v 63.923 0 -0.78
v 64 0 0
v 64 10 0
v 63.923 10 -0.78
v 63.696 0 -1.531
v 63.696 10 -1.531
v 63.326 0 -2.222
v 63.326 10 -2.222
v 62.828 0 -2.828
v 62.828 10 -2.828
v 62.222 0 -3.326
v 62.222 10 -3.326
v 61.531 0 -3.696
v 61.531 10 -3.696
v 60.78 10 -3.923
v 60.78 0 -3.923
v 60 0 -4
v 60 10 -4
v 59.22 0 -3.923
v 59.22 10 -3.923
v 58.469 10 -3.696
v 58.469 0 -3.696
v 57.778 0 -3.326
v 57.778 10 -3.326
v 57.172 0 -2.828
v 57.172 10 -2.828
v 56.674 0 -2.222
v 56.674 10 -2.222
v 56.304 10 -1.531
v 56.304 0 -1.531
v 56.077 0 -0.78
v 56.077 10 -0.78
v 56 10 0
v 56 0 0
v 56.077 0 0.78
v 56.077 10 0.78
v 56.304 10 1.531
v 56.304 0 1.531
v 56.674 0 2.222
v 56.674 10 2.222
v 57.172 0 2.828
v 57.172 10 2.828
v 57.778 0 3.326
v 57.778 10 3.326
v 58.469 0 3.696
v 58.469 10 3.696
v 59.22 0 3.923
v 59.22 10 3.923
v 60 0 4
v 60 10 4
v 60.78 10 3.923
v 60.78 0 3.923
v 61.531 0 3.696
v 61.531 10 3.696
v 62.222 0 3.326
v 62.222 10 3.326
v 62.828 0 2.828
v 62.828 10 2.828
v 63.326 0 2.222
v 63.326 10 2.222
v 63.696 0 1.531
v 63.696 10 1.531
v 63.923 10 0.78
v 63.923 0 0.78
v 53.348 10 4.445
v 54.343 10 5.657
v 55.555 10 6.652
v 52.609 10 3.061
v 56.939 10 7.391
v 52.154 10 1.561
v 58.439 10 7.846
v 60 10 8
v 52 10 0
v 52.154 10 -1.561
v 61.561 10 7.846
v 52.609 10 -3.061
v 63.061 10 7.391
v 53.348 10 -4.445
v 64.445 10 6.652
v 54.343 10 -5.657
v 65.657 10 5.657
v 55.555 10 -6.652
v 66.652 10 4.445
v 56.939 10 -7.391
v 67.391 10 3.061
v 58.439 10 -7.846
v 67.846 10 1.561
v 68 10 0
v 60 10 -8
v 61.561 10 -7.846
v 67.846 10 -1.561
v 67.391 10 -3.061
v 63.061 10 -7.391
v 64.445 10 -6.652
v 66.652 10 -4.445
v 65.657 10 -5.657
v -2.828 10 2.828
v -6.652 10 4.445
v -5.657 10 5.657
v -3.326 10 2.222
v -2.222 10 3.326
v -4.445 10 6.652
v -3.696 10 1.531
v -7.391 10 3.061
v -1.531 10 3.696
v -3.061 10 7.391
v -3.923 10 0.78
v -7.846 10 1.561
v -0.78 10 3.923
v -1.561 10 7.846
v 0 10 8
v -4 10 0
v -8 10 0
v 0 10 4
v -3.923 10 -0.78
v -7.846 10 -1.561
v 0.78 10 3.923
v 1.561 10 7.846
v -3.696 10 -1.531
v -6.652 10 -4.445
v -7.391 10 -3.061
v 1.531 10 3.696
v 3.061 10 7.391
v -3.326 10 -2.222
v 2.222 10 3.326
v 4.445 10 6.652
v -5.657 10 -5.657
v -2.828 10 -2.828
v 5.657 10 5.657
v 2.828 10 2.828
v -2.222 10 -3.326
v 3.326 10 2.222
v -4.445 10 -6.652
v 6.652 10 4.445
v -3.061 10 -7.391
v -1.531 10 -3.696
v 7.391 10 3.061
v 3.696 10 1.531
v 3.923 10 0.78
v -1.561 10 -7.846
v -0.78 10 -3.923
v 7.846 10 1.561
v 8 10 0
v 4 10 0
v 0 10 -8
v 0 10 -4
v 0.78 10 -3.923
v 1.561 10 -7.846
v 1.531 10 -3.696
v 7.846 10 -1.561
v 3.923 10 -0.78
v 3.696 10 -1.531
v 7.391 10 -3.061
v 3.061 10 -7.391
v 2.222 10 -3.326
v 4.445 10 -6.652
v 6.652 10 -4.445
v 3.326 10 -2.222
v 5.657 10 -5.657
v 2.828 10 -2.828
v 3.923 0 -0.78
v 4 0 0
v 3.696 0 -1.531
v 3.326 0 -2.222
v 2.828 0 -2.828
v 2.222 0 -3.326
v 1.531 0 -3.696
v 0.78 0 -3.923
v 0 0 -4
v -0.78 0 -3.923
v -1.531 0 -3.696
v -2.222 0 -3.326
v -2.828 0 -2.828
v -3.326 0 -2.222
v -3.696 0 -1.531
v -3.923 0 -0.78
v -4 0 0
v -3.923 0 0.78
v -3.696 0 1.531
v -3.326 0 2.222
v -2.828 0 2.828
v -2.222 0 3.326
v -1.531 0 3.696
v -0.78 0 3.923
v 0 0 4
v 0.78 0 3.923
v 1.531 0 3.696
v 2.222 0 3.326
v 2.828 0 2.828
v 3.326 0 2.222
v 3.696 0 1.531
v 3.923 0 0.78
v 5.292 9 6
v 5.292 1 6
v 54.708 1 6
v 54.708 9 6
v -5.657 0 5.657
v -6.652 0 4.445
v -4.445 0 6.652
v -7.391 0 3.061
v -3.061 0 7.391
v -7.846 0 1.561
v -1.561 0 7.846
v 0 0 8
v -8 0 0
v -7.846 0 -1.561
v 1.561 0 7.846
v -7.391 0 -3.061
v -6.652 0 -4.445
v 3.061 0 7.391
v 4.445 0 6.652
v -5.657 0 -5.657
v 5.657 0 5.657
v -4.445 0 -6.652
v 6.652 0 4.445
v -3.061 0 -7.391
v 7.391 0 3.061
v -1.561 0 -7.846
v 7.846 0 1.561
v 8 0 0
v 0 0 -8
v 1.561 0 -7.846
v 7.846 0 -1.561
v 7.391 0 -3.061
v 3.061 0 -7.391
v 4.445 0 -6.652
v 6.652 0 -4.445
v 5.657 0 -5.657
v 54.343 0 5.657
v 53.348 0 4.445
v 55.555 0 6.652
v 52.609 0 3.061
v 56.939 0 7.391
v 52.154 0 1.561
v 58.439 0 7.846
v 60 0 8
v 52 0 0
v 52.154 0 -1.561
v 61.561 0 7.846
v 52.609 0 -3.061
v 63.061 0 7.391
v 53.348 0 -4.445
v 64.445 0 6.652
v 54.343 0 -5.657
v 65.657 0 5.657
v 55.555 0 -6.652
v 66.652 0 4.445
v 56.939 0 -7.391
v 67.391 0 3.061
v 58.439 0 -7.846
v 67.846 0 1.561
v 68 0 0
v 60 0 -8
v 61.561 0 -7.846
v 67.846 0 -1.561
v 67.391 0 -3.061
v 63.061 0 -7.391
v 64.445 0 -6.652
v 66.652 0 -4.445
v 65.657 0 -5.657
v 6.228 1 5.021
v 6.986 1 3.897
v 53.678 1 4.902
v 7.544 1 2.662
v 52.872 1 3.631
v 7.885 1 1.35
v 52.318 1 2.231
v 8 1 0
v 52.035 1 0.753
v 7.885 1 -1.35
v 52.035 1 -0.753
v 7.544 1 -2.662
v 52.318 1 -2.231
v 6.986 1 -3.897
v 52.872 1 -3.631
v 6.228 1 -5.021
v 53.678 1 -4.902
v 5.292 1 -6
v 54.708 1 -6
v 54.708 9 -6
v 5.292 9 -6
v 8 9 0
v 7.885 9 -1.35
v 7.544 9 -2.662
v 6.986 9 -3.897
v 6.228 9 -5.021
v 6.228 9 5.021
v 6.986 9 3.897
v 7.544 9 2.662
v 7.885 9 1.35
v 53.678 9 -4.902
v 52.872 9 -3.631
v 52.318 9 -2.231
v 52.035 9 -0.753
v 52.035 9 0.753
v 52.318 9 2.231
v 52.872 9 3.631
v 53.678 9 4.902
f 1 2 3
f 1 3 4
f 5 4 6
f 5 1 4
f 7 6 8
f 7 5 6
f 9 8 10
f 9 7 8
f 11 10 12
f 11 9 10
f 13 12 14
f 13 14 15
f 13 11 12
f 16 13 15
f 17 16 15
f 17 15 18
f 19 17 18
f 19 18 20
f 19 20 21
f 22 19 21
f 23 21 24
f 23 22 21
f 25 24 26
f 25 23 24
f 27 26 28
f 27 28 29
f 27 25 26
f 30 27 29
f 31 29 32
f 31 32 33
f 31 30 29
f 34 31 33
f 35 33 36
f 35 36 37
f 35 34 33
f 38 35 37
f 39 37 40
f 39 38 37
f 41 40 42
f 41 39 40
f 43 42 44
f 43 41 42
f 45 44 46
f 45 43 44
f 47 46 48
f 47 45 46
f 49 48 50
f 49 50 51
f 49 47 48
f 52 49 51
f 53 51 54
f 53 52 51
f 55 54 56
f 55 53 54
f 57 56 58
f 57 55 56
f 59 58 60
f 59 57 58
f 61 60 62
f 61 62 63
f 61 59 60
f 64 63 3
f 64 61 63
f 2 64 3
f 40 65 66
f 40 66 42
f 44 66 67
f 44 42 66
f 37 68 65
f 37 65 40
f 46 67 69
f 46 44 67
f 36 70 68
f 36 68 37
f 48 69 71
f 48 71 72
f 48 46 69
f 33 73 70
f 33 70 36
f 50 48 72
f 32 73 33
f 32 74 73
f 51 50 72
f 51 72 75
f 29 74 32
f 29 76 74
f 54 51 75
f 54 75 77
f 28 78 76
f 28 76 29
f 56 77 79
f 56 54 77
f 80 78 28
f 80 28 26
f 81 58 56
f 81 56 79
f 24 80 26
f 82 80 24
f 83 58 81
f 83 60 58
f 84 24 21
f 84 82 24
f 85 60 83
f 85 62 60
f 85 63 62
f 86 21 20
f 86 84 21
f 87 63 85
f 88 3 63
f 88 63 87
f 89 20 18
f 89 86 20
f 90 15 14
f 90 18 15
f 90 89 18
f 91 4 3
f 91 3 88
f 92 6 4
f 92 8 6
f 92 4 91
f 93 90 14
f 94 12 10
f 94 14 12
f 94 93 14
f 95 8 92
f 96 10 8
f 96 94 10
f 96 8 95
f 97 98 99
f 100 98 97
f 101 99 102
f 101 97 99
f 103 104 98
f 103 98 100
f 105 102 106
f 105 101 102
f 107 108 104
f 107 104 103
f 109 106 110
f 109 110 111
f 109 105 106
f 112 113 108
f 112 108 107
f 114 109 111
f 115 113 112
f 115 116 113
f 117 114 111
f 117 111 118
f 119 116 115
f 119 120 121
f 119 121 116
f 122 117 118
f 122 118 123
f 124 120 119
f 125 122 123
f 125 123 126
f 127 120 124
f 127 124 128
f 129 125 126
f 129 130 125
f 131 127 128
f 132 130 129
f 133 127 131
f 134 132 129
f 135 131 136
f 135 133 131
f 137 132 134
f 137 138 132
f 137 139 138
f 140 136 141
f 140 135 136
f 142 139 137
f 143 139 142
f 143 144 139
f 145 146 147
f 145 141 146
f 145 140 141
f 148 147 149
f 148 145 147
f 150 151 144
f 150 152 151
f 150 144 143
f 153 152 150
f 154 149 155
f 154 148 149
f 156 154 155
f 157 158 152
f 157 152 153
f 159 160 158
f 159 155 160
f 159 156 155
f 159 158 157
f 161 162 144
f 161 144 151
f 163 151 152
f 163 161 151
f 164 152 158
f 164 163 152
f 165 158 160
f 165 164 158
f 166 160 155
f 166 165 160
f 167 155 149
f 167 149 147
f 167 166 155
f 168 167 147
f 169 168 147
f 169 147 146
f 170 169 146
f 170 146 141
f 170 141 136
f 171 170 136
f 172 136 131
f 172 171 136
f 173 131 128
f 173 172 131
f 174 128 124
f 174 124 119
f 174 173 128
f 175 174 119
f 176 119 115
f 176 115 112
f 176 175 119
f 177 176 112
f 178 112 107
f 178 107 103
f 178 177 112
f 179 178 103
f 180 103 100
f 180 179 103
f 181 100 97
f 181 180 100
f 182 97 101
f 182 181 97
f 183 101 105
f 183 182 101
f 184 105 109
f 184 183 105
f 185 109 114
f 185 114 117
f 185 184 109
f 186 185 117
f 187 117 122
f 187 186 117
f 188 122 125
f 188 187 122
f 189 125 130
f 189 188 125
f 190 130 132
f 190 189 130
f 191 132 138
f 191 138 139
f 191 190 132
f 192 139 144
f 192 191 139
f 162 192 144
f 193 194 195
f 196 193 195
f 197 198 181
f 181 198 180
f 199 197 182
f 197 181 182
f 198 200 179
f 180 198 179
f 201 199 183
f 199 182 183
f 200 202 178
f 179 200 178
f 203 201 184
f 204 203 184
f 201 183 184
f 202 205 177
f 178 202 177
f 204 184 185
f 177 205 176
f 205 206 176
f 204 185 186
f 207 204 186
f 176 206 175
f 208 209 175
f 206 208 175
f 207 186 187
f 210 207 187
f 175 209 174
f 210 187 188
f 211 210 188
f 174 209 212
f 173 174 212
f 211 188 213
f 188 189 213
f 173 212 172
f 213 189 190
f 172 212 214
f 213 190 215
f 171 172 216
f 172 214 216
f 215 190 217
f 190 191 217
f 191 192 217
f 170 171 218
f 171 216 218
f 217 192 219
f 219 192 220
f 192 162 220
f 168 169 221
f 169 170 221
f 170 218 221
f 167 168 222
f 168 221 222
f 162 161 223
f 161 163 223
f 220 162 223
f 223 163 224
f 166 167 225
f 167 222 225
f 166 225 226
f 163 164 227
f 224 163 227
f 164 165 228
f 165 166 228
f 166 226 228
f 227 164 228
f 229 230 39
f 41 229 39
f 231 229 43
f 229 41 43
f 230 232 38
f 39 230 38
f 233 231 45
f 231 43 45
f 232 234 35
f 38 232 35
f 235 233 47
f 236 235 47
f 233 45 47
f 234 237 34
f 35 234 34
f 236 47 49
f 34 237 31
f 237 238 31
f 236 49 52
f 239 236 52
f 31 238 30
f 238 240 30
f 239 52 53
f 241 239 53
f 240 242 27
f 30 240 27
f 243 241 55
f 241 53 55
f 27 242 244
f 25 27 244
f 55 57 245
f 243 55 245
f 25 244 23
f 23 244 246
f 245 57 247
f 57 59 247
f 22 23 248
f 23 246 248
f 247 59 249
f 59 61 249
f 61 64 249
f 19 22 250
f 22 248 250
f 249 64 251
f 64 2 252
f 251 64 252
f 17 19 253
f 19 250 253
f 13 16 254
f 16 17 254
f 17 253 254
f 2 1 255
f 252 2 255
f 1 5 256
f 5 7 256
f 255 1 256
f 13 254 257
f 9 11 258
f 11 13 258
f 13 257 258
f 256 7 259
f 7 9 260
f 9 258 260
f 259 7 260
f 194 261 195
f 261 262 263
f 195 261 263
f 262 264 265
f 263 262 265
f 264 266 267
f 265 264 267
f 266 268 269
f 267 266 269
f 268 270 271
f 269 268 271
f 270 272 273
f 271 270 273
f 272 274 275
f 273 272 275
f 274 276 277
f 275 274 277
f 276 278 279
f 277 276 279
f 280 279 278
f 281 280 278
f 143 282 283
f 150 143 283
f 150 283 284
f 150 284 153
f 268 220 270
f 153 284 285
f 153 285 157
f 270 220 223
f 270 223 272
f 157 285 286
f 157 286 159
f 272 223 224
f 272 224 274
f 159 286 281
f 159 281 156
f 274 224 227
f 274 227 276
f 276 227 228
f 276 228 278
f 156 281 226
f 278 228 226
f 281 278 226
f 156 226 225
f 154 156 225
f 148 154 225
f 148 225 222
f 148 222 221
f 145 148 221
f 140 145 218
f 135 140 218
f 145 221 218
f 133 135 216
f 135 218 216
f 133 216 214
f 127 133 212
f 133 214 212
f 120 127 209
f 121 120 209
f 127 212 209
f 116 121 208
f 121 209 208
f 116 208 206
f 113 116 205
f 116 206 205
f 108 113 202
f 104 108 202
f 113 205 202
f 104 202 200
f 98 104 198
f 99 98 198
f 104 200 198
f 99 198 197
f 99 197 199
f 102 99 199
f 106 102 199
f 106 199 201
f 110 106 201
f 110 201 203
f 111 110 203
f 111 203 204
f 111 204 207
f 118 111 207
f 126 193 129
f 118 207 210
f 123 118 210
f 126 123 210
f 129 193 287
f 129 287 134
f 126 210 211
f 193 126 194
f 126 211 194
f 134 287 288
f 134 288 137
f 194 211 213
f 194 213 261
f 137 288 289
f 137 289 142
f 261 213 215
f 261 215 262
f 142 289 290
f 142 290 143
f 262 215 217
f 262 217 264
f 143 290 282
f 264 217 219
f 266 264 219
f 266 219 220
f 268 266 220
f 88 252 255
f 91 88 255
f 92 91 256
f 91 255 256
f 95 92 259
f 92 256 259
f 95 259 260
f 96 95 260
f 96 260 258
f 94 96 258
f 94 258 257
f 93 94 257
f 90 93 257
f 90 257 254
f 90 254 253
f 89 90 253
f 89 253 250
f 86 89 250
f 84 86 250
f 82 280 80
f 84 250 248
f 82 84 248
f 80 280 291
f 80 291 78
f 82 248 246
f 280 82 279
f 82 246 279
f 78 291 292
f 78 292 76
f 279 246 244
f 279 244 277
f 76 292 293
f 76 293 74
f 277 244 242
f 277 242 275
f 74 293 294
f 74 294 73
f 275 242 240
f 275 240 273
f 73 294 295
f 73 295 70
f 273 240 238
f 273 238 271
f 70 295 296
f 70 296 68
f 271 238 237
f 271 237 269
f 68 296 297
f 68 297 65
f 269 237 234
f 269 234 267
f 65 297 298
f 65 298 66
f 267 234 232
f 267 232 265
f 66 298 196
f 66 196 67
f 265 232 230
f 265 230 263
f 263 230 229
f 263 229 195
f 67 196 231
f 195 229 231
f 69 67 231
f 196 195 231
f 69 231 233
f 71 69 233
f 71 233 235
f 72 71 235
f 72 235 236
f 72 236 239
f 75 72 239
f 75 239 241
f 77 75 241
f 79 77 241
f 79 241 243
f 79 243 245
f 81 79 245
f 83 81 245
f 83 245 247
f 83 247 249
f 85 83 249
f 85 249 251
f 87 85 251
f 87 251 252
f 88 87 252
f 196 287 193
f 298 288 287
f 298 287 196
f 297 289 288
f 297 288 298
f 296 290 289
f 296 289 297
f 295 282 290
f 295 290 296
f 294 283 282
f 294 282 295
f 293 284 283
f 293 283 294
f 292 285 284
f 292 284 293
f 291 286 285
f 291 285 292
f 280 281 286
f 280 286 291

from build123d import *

# Parameters (mm, degrees)
SKETCH_1_R        = 8
SKETCH_1_R_2      = 4
EXTRUDE_1_DEPTH   = 10
EXTRUDE_1_2_DEPTH = 10
EXTRUDE_START     = 1
EXTRUDE_2_DEPTH   = 8


with BuildPart() as part:
    # 草图1 → 凸台-拉伸1 (new body)
    with BuildSketch(Plane(origin=(0, 0, 0), x_dir=(1, 0, 0), z_dir=(0, 1, 0))):
        Circle(SKETCH_1_R)
        Circle(SKETCH_1_R_2, mode=Mode.SUBTRACT)
    extrude(amount=EXTRUDE_1_DEPTH)



with BuildPart() as body_2:
    # 草图1 → Extrude 1 2 (new body)
    with BuildSketch(Plane(origin=(0, 0, 0), x_dir=(1, 0, 0), z_dir=(0, 1, 0))):
        with Locations((60, 0)):
            Circle(SKETCH_1_R)
        with Locations((60, 0)):
            Circle(SKETCH_1_R_2, mode=Mode.SUBTRACT)
    extrude(amount=EXTRUDE_1_2_DEPTH)


with BuildPart() as part_1:
    add(part.part)

    add(body_2.part)  # 凸台-拉伸2 merges body 2
    # 草图2 → 凸台-拉伸2 (add)
    with BuildSketch(Plane(origin=(0, 0, 0), x_dir=(1, 0, 0), z_dir=(0, 1, 0)).offset(EXTRUDE_START)):
        with BuildLine():
            Line((5.291502622, -6), (54.708497378, -6))
            ThreePointArc((54.708497378, -6), (52, 0), (54.708497378, 6))
            Line((54.708497378, 6), (5.291502622, 6))
            ThreePointArc((5.291502622, 6), (8, 0), (5.291502622, -6))
        make_face()
    extrude(amount=EXTRUDE_2_DEPTH)


solid = part_1.part
